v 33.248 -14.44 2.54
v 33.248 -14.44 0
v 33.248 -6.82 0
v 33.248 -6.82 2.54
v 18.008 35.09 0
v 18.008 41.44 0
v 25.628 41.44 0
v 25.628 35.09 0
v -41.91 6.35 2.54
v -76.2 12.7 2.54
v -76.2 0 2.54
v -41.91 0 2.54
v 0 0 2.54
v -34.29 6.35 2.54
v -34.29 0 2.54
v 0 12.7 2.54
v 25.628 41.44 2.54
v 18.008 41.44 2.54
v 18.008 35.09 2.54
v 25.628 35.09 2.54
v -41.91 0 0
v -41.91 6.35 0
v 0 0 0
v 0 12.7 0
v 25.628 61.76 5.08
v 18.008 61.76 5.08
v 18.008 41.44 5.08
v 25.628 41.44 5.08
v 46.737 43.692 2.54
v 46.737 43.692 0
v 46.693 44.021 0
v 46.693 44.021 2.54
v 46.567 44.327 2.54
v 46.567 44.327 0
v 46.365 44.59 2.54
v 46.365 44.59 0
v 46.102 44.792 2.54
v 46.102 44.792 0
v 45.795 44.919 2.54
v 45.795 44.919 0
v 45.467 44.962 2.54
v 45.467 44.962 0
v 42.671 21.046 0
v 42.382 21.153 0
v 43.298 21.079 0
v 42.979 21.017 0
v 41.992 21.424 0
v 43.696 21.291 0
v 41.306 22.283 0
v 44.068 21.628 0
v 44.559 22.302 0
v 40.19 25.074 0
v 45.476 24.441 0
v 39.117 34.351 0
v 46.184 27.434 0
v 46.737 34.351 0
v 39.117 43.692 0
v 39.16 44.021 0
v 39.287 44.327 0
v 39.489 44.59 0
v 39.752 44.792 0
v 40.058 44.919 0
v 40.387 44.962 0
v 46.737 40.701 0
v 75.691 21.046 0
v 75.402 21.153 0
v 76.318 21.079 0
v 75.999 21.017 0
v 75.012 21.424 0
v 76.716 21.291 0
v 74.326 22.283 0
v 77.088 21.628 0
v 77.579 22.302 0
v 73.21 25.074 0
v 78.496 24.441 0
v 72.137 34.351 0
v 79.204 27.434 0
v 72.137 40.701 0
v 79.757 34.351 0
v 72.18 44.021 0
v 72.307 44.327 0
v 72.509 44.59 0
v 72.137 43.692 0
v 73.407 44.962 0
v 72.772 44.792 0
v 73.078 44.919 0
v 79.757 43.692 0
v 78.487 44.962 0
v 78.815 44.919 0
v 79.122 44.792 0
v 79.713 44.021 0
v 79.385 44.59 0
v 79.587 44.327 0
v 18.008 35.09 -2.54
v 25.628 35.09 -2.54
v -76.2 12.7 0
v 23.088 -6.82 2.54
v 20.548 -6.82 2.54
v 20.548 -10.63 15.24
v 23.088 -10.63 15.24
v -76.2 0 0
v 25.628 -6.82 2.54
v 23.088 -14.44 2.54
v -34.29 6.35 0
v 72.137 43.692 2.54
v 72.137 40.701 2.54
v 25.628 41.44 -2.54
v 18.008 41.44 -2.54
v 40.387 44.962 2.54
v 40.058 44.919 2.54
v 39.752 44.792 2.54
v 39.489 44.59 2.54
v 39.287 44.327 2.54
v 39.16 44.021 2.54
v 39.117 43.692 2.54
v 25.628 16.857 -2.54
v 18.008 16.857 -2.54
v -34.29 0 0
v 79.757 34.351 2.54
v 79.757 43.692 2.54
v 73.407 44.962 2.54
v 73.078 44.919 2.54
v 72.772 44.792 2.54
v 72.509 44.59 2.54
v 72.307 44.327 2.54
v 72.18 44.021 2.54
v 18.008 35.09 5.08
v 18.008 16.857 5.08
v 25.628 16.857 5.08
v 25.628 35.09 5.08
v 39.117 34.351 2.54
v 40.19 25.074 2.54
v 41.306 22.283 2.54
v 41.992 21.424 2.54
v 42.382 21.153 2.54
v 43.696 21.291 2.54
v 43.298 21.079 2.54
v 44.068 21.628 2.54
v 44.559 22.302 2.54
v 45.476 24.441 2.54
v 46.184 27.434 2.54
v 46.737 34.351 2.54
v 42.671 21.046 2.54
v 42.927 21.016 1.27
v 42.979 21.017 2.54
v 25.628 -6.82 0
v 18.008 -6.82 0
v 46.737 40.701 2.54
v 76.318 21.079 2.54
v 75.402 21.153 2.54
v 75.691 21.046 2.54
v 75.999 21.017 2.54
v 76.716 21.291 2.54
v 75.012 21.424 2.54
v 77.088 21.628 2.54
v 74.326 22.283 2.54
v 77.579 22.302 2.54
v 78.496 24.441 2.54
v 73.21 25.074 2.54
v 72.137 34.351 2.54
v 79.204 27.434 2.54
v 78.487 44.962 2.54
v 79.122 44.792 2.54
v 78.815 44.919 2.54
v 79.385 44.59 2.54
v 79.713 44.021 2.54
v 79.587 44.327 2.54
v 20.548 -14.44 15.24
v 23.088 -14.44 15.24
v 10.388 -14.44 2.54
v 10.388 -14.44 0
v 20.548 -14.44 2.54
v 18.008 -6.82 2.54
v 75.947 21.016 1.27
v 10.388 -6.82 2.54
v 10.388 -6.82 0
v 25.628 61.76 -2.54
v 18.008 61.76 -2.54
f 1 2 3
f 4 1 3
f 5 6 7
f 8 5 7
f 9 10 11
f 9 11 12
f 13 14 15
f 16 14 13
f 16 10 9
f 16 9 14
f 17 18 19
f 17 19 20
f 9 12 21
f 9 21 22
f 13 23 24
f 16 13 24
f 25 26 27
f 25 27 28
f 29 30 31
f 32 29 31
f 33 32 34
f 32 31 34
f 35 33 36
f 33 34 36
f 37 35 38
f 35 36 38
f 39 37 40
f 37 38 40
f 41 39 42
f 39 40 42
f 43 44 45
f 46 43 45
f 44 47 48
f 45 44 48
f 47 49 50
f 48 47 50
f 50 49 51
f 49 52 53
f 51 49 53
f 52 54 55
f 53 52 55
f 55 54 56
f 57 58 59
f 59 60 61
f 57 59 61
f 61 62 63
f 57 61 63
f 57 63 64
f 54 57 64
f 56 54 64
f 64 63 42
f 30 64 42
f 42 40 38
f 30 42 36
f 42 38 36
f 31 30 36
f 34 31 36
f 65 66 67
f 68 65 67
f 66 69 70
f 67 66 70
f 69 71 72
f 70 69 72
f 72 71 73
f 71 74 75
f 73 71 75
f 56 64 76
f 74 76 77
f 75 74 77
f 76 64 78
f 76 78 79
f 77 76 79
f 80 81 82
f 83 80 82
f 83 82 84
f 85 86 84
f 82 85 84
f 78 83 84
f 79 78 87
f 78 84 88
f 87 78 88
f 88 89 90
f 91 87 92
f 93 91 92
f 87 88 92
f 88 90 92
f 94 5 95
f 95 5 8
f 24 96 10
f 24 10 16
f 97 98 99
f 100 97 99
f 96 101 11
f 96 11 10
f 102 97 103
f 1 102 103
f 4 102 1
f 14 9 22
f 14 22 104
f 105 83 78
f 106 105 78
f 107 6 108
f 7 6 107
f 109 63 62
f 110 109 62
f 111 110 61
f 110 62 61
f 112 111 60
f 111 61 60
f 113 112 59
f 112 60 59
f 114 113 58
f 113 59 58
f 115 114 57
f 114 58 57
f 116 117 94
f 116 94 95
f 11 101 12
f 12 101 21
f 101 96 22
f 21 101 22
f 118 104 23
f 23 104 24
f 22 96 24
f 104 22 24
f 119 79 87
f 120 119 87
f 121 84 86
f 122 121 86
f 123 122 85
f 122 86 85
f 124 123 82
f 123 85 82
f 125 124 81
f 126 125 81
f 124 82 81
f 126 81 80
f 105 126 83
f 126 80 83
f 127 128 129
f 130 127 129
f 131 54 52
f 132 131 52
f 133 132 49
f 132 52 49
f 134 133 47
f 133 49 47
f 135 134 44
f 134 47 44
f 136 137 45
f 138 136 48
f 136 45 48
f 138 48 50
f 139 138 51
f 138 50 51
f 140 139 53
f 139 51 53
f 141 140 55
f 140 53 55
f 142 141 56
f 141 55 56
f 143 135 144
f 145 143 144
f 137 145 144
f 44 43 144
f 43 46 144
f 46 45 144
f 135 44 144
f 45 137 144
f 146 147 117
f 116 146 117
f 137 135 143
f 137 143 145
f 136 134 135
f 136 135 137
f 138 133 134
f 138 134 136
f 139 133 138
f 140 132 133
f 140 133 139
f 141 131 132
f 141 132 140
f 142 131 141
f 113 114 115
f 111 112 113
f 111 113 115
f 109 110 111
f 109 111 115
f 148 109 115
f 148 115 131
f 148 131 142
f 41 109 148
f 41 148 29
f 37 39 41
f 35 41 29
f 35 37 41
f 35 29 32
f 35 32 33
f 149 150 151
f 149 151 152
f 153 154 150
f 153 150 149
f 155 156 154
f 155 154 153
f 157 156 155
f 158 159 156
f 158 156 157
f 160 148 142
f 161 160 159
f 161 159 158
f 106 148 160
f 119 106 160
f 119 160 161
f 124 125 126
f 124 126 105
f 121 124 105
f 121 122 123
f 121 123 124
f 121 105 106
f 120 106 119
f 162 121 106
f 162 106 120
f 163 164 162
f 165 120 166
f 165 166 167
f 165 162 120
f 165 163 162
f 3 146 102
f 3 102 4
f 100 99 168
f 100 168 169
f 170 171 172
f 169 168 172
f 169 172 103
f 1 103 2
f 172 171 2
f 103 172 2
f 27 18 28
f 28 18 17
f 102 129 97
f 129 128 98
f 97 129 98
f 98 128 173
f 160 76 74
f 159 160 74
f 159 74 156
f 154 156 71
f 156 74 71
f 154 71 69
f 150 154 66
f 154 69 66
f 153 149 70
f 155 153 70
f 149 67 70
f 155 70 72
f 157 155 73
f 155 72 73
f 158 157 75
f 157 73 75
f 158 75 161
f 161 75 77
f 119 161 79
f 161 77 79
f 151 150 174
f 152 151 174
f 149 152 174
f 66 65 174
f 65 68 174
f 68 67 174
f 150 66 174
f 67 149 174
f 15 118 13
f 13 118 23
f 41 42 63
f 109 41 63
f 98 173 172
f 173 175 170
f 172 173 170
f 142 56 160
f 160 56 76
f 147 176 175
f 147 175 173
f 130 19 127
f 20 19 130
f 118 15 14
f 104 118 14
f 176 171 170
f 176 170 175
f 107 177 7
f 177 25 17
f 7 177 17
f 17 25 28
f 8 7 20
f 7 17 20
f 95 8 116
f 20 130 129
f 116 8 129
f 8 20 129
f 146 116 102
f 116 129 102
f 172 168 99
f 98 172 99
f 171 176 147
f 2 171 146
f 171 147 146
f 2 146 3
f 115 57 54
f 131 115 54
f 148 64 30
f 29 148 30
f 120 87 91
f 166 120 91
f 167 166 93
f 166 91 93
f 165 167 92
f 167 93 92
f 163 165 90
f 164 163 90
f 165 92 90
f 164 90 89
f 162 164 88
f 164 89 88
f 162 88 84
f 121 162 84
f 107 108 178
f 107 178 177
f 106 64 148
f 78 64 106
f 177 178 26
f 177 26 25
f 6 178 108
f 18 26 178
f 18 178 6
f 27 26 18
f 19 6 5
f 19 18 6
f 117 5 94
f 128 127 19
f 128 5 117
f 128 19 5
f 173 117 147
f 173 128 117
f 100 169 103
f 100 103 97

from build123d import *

# Parameters (mm, degrees)
F0_W      = 76.2
F0_H      = 12.7
F1_DEPTH  = 2.54
F2_W      = 7.62
F2_H      = 6.35
F3_DEPTH  = 2.54
F4_W      = 7.62
F4_H      = 76.2
F5_DEPTH  = 2.54
F6_W      = 7.62
F6_H      = 20.32
F6_H_2    = 49.53
F7_DEPTH  = 2.54
F8_W      = 7.62
F8_H      = 20.32
F8_H_2    = 49.53
F9_DEPTH  = 2.54
F10_W     = 25.4
F10_H     = 6.35
F11_DEPTH = 2.54
F12_W     = 22.86
F12_H     = 7.62
F13_DEPTH = 2.54
F14_W     = 2.54
F14_H     = 7.62
F15_DEPTH = 15.24
F17_DEPTH = 7.62
F18_W     = 7.62
F18_H     = 2.54
F19_DEPTH = 2.54
F20_W     = 7.62
F20_H     = 2.54
F21_DEPTH = 2.54
F23_DEPTH = 7.62
F25_DEPTH = 2.54


with BuildPart() as f1:
    # F0 (on Top) → F1 (new body)
    with BuildSketch(Plane.XY):
        with Locations((-38.1, 6.35)):
            Rectangle(F0_W, F0_H)
    extrude(amount=F1_DEPTH)

    # F2 (on face) → F3 (cut, through all)
    with BuildSketch(Plane.XY.offset(2.54)):
        with Locations((-38.1, 3.175)):
            Rectangle(F2_W, F2_H)
    extrude(amount=-F3_DEPTH, mode=Mode.SUBTRACT)


with BuildPart() as f5:
    # F4 (on Top) → F5 (new body)
    with BuildSketch(Plane.XY):
        with Locations((21.8177004717, 23.6597382314)):
            Rectangle(F4_W, F4_H)
    extrude(amount=F5_DEPTH)

    # F6 (on face) → F7 (join)
    with BuildSketch(Plane.XY.offset(2.54)):
        with Locations((21.8177004717, 51.5997382314)):
            Rectangle(F6_W, F6_H)
        with Locations((21.8177004717, 10.3247382314)):
            Rectangle(F6_W, F6_H_2)
    extrude(amount=F7_DEPTH)

    # F8 (on face) → F9 (join)
    with BuildSketch(Plane(origin=(0, 0, 0), x_dir=(1, 0, 0), z_dir=(0, 0, -1))):
        with Locations((21.8177004717, -51.5997382314)):
            Rectangle(F8_W, F8_H)
        with Locations((21.8177004717, -10.3247382314)):
            Rectangle(F8_W, F8_H_2)
    extrude(amount=F9_DEPTH)

    # F12 (on Top) → F13 (join)
    with BuildSketch(Plane.XY):
        with Locations((21.8177004717, -10.6302617686)):
            Rectangle(F12_W, F12_H)
    extrude(amount=F13_DEPTH)

    # F14 (on Top) → F15 (join)
    with BuildSketch(Plane.XY):
        with Locations((21.8177004717, -10.6302617686)):
            Rectangle(F14_W, F14_H)
    extrude(amount=F15_DEPTH)

    # F16 (on face) → F17 (cut, through all)
    with BuildSketch(Plane(origin=(18.0077004717, 0, 0), x_dir=(0, -1, 0), z_dir=(-1, 0, 0))):
        Polygon((-16.8571248651, -2.54), (14.4402617686, -2.54), (14.4402617686, 0), (6.8202617686, 0), align=None)
    extrude(amount=-F17_DEPTH, mode=Mode.SUBTRACT)

    # F18 (on face) → F19 (cut)
    with BuildSketch(Plane(origin=(18.0077004717, 0, 0), x_dir=(0, -1, 0), z_dir=(-1, 0, 0))):
        with Locations((10.6302617686, 3.81)):
            Rectangle(F18_W, F18_H)
    extrude(amount=-F19_DEPTH, mode=Mode.SUBTRACT)

    # F20 (on face) → F21 (cut)
    with BuildSketch(Plane.YZ.offset(25.6277004717)):
        with Locations((-10.6302617686, 3.81)):
            Rectangle(F20_W, F20_H)
    extrude(amount=-F21_DEPTH, mode=Mode.SUBTRACT)

    # F22 (on face) → F23 (cut, through all)
    with BuildSketch(Plane(origin=(18.0077004717, 0, 0), x_dir=(0, -1, 0), z_dir=(-1, 0, 0))):
        Polygon((-16.8571248651, 5.08), (6.8202617686, 2.54), (6.8202617686, 5.08), align=None)
    extrude(amount=-F23_DEPTH, mode=Mode.SUBTRACT)

    # F24 (on face) → F25 (cut, through all)
    with BuildSketch(Plane(origin=(20.5477004717, 0, 0), x_dir=(0, -1, 0), z_dir=(-1, 0, 0))):
        Polygon((6.8202617686, 15.24), (6.8202617686, 2.54), (10.6302617686, 15.24), align=None)
    extrude(amount=-F25_DEPTH, mode=Mode.SUBTRACT)


with BuildPart() as f11:
    # F10 (on Top) → F11 (new body)
    with BuildSketch(Plane.XY):
        with Locations((59.4366904274, 37.5256821616)):
            Rectangle(F10_W, F10_H)
        with BuildLine():
            Line((46.7366904274, 34.3506821616), (46.7366904274, 40.7006821616))
            Line((46.7366904274, 40.7006821616), (46.7366904274, 43.6919351065))
            ThreePointArc((46.7366904274, 43.6919351065), (46.3647160395, 44.5899607186), (45.4666904274, 44.9619351065))
            Line((45.4666904274, 44.9619351065), (40.3866904274, 44.9619351065))
            ThreePointArc((40.3866904274, 44.9619351065), (39.4886648153, 44.5899607186), (39.1166904274, 43.6919351065))
            Line((39.1166904274, 43.6919351065), (39.1166904274, 34.3506821616))
            add(Edge.make_bspline(
                [(39.1166904274, 34.3506821616), (39.1166904274, 21.0156821616), (42.9266904274, 21.0156821616), (46.7366904274, 21.0156821616), (46.7366904274, 34.3506821616)],
                knots=[4.7123889804, 4.7123889804, 4.7123889804, 6.2831853072, 6.2831853072, 7.853981634, 7.853981634, 7.853981634], degree=2, weights=[1, 0.7071067812, 1, 0.7071067812, 1]))
        make_face()
        with BuildLine():
            Line((72.1366904274, 43.6919351065), (72.1366904274, 40.7006821616))
            Line((72.1366904274, 40.7006821616), (72.1366904274, 34.3506821616))
            add(Edge.make_bspline(
                [(72.1366904274, 34.3506821616), (72.1366904274, 21.0156821616), (75.9466904274, 21.0156821616), (79.7566904274, 21.0156821616), (79.7566904274, 34.3506821616)],
                knots=[4.7123889804, 4.7123889804, 4.7123889804, 6.2831853072, 6.2831853072, 7.853981634, 7.853981634, 7.853981634], degree=2, weights=[1, 0.7071067812, 1, 0.7071067812, 1]))
            Line((79.7566904274, 34.3506821616), (79.7566904274, 43.6919351065))
            ThreePointArc((79.7566904274, 43.6919351065), (79.3847160395, 44.5899607186), (78.4866904274, 44.9619351065))
            Line((78.4866904274, 44.9619351065), (73.4066904274, 44.9619351065))
            ThreePointArc((73.4066904274, 44.9619351065), (72.5086648153, 44.5899607186), (72.1366904274, 43.6919351065))
        make_face()
    extrude(amount=F11_DEPTH)


solid = Compound([f1.part, f5.part, f11.part])
